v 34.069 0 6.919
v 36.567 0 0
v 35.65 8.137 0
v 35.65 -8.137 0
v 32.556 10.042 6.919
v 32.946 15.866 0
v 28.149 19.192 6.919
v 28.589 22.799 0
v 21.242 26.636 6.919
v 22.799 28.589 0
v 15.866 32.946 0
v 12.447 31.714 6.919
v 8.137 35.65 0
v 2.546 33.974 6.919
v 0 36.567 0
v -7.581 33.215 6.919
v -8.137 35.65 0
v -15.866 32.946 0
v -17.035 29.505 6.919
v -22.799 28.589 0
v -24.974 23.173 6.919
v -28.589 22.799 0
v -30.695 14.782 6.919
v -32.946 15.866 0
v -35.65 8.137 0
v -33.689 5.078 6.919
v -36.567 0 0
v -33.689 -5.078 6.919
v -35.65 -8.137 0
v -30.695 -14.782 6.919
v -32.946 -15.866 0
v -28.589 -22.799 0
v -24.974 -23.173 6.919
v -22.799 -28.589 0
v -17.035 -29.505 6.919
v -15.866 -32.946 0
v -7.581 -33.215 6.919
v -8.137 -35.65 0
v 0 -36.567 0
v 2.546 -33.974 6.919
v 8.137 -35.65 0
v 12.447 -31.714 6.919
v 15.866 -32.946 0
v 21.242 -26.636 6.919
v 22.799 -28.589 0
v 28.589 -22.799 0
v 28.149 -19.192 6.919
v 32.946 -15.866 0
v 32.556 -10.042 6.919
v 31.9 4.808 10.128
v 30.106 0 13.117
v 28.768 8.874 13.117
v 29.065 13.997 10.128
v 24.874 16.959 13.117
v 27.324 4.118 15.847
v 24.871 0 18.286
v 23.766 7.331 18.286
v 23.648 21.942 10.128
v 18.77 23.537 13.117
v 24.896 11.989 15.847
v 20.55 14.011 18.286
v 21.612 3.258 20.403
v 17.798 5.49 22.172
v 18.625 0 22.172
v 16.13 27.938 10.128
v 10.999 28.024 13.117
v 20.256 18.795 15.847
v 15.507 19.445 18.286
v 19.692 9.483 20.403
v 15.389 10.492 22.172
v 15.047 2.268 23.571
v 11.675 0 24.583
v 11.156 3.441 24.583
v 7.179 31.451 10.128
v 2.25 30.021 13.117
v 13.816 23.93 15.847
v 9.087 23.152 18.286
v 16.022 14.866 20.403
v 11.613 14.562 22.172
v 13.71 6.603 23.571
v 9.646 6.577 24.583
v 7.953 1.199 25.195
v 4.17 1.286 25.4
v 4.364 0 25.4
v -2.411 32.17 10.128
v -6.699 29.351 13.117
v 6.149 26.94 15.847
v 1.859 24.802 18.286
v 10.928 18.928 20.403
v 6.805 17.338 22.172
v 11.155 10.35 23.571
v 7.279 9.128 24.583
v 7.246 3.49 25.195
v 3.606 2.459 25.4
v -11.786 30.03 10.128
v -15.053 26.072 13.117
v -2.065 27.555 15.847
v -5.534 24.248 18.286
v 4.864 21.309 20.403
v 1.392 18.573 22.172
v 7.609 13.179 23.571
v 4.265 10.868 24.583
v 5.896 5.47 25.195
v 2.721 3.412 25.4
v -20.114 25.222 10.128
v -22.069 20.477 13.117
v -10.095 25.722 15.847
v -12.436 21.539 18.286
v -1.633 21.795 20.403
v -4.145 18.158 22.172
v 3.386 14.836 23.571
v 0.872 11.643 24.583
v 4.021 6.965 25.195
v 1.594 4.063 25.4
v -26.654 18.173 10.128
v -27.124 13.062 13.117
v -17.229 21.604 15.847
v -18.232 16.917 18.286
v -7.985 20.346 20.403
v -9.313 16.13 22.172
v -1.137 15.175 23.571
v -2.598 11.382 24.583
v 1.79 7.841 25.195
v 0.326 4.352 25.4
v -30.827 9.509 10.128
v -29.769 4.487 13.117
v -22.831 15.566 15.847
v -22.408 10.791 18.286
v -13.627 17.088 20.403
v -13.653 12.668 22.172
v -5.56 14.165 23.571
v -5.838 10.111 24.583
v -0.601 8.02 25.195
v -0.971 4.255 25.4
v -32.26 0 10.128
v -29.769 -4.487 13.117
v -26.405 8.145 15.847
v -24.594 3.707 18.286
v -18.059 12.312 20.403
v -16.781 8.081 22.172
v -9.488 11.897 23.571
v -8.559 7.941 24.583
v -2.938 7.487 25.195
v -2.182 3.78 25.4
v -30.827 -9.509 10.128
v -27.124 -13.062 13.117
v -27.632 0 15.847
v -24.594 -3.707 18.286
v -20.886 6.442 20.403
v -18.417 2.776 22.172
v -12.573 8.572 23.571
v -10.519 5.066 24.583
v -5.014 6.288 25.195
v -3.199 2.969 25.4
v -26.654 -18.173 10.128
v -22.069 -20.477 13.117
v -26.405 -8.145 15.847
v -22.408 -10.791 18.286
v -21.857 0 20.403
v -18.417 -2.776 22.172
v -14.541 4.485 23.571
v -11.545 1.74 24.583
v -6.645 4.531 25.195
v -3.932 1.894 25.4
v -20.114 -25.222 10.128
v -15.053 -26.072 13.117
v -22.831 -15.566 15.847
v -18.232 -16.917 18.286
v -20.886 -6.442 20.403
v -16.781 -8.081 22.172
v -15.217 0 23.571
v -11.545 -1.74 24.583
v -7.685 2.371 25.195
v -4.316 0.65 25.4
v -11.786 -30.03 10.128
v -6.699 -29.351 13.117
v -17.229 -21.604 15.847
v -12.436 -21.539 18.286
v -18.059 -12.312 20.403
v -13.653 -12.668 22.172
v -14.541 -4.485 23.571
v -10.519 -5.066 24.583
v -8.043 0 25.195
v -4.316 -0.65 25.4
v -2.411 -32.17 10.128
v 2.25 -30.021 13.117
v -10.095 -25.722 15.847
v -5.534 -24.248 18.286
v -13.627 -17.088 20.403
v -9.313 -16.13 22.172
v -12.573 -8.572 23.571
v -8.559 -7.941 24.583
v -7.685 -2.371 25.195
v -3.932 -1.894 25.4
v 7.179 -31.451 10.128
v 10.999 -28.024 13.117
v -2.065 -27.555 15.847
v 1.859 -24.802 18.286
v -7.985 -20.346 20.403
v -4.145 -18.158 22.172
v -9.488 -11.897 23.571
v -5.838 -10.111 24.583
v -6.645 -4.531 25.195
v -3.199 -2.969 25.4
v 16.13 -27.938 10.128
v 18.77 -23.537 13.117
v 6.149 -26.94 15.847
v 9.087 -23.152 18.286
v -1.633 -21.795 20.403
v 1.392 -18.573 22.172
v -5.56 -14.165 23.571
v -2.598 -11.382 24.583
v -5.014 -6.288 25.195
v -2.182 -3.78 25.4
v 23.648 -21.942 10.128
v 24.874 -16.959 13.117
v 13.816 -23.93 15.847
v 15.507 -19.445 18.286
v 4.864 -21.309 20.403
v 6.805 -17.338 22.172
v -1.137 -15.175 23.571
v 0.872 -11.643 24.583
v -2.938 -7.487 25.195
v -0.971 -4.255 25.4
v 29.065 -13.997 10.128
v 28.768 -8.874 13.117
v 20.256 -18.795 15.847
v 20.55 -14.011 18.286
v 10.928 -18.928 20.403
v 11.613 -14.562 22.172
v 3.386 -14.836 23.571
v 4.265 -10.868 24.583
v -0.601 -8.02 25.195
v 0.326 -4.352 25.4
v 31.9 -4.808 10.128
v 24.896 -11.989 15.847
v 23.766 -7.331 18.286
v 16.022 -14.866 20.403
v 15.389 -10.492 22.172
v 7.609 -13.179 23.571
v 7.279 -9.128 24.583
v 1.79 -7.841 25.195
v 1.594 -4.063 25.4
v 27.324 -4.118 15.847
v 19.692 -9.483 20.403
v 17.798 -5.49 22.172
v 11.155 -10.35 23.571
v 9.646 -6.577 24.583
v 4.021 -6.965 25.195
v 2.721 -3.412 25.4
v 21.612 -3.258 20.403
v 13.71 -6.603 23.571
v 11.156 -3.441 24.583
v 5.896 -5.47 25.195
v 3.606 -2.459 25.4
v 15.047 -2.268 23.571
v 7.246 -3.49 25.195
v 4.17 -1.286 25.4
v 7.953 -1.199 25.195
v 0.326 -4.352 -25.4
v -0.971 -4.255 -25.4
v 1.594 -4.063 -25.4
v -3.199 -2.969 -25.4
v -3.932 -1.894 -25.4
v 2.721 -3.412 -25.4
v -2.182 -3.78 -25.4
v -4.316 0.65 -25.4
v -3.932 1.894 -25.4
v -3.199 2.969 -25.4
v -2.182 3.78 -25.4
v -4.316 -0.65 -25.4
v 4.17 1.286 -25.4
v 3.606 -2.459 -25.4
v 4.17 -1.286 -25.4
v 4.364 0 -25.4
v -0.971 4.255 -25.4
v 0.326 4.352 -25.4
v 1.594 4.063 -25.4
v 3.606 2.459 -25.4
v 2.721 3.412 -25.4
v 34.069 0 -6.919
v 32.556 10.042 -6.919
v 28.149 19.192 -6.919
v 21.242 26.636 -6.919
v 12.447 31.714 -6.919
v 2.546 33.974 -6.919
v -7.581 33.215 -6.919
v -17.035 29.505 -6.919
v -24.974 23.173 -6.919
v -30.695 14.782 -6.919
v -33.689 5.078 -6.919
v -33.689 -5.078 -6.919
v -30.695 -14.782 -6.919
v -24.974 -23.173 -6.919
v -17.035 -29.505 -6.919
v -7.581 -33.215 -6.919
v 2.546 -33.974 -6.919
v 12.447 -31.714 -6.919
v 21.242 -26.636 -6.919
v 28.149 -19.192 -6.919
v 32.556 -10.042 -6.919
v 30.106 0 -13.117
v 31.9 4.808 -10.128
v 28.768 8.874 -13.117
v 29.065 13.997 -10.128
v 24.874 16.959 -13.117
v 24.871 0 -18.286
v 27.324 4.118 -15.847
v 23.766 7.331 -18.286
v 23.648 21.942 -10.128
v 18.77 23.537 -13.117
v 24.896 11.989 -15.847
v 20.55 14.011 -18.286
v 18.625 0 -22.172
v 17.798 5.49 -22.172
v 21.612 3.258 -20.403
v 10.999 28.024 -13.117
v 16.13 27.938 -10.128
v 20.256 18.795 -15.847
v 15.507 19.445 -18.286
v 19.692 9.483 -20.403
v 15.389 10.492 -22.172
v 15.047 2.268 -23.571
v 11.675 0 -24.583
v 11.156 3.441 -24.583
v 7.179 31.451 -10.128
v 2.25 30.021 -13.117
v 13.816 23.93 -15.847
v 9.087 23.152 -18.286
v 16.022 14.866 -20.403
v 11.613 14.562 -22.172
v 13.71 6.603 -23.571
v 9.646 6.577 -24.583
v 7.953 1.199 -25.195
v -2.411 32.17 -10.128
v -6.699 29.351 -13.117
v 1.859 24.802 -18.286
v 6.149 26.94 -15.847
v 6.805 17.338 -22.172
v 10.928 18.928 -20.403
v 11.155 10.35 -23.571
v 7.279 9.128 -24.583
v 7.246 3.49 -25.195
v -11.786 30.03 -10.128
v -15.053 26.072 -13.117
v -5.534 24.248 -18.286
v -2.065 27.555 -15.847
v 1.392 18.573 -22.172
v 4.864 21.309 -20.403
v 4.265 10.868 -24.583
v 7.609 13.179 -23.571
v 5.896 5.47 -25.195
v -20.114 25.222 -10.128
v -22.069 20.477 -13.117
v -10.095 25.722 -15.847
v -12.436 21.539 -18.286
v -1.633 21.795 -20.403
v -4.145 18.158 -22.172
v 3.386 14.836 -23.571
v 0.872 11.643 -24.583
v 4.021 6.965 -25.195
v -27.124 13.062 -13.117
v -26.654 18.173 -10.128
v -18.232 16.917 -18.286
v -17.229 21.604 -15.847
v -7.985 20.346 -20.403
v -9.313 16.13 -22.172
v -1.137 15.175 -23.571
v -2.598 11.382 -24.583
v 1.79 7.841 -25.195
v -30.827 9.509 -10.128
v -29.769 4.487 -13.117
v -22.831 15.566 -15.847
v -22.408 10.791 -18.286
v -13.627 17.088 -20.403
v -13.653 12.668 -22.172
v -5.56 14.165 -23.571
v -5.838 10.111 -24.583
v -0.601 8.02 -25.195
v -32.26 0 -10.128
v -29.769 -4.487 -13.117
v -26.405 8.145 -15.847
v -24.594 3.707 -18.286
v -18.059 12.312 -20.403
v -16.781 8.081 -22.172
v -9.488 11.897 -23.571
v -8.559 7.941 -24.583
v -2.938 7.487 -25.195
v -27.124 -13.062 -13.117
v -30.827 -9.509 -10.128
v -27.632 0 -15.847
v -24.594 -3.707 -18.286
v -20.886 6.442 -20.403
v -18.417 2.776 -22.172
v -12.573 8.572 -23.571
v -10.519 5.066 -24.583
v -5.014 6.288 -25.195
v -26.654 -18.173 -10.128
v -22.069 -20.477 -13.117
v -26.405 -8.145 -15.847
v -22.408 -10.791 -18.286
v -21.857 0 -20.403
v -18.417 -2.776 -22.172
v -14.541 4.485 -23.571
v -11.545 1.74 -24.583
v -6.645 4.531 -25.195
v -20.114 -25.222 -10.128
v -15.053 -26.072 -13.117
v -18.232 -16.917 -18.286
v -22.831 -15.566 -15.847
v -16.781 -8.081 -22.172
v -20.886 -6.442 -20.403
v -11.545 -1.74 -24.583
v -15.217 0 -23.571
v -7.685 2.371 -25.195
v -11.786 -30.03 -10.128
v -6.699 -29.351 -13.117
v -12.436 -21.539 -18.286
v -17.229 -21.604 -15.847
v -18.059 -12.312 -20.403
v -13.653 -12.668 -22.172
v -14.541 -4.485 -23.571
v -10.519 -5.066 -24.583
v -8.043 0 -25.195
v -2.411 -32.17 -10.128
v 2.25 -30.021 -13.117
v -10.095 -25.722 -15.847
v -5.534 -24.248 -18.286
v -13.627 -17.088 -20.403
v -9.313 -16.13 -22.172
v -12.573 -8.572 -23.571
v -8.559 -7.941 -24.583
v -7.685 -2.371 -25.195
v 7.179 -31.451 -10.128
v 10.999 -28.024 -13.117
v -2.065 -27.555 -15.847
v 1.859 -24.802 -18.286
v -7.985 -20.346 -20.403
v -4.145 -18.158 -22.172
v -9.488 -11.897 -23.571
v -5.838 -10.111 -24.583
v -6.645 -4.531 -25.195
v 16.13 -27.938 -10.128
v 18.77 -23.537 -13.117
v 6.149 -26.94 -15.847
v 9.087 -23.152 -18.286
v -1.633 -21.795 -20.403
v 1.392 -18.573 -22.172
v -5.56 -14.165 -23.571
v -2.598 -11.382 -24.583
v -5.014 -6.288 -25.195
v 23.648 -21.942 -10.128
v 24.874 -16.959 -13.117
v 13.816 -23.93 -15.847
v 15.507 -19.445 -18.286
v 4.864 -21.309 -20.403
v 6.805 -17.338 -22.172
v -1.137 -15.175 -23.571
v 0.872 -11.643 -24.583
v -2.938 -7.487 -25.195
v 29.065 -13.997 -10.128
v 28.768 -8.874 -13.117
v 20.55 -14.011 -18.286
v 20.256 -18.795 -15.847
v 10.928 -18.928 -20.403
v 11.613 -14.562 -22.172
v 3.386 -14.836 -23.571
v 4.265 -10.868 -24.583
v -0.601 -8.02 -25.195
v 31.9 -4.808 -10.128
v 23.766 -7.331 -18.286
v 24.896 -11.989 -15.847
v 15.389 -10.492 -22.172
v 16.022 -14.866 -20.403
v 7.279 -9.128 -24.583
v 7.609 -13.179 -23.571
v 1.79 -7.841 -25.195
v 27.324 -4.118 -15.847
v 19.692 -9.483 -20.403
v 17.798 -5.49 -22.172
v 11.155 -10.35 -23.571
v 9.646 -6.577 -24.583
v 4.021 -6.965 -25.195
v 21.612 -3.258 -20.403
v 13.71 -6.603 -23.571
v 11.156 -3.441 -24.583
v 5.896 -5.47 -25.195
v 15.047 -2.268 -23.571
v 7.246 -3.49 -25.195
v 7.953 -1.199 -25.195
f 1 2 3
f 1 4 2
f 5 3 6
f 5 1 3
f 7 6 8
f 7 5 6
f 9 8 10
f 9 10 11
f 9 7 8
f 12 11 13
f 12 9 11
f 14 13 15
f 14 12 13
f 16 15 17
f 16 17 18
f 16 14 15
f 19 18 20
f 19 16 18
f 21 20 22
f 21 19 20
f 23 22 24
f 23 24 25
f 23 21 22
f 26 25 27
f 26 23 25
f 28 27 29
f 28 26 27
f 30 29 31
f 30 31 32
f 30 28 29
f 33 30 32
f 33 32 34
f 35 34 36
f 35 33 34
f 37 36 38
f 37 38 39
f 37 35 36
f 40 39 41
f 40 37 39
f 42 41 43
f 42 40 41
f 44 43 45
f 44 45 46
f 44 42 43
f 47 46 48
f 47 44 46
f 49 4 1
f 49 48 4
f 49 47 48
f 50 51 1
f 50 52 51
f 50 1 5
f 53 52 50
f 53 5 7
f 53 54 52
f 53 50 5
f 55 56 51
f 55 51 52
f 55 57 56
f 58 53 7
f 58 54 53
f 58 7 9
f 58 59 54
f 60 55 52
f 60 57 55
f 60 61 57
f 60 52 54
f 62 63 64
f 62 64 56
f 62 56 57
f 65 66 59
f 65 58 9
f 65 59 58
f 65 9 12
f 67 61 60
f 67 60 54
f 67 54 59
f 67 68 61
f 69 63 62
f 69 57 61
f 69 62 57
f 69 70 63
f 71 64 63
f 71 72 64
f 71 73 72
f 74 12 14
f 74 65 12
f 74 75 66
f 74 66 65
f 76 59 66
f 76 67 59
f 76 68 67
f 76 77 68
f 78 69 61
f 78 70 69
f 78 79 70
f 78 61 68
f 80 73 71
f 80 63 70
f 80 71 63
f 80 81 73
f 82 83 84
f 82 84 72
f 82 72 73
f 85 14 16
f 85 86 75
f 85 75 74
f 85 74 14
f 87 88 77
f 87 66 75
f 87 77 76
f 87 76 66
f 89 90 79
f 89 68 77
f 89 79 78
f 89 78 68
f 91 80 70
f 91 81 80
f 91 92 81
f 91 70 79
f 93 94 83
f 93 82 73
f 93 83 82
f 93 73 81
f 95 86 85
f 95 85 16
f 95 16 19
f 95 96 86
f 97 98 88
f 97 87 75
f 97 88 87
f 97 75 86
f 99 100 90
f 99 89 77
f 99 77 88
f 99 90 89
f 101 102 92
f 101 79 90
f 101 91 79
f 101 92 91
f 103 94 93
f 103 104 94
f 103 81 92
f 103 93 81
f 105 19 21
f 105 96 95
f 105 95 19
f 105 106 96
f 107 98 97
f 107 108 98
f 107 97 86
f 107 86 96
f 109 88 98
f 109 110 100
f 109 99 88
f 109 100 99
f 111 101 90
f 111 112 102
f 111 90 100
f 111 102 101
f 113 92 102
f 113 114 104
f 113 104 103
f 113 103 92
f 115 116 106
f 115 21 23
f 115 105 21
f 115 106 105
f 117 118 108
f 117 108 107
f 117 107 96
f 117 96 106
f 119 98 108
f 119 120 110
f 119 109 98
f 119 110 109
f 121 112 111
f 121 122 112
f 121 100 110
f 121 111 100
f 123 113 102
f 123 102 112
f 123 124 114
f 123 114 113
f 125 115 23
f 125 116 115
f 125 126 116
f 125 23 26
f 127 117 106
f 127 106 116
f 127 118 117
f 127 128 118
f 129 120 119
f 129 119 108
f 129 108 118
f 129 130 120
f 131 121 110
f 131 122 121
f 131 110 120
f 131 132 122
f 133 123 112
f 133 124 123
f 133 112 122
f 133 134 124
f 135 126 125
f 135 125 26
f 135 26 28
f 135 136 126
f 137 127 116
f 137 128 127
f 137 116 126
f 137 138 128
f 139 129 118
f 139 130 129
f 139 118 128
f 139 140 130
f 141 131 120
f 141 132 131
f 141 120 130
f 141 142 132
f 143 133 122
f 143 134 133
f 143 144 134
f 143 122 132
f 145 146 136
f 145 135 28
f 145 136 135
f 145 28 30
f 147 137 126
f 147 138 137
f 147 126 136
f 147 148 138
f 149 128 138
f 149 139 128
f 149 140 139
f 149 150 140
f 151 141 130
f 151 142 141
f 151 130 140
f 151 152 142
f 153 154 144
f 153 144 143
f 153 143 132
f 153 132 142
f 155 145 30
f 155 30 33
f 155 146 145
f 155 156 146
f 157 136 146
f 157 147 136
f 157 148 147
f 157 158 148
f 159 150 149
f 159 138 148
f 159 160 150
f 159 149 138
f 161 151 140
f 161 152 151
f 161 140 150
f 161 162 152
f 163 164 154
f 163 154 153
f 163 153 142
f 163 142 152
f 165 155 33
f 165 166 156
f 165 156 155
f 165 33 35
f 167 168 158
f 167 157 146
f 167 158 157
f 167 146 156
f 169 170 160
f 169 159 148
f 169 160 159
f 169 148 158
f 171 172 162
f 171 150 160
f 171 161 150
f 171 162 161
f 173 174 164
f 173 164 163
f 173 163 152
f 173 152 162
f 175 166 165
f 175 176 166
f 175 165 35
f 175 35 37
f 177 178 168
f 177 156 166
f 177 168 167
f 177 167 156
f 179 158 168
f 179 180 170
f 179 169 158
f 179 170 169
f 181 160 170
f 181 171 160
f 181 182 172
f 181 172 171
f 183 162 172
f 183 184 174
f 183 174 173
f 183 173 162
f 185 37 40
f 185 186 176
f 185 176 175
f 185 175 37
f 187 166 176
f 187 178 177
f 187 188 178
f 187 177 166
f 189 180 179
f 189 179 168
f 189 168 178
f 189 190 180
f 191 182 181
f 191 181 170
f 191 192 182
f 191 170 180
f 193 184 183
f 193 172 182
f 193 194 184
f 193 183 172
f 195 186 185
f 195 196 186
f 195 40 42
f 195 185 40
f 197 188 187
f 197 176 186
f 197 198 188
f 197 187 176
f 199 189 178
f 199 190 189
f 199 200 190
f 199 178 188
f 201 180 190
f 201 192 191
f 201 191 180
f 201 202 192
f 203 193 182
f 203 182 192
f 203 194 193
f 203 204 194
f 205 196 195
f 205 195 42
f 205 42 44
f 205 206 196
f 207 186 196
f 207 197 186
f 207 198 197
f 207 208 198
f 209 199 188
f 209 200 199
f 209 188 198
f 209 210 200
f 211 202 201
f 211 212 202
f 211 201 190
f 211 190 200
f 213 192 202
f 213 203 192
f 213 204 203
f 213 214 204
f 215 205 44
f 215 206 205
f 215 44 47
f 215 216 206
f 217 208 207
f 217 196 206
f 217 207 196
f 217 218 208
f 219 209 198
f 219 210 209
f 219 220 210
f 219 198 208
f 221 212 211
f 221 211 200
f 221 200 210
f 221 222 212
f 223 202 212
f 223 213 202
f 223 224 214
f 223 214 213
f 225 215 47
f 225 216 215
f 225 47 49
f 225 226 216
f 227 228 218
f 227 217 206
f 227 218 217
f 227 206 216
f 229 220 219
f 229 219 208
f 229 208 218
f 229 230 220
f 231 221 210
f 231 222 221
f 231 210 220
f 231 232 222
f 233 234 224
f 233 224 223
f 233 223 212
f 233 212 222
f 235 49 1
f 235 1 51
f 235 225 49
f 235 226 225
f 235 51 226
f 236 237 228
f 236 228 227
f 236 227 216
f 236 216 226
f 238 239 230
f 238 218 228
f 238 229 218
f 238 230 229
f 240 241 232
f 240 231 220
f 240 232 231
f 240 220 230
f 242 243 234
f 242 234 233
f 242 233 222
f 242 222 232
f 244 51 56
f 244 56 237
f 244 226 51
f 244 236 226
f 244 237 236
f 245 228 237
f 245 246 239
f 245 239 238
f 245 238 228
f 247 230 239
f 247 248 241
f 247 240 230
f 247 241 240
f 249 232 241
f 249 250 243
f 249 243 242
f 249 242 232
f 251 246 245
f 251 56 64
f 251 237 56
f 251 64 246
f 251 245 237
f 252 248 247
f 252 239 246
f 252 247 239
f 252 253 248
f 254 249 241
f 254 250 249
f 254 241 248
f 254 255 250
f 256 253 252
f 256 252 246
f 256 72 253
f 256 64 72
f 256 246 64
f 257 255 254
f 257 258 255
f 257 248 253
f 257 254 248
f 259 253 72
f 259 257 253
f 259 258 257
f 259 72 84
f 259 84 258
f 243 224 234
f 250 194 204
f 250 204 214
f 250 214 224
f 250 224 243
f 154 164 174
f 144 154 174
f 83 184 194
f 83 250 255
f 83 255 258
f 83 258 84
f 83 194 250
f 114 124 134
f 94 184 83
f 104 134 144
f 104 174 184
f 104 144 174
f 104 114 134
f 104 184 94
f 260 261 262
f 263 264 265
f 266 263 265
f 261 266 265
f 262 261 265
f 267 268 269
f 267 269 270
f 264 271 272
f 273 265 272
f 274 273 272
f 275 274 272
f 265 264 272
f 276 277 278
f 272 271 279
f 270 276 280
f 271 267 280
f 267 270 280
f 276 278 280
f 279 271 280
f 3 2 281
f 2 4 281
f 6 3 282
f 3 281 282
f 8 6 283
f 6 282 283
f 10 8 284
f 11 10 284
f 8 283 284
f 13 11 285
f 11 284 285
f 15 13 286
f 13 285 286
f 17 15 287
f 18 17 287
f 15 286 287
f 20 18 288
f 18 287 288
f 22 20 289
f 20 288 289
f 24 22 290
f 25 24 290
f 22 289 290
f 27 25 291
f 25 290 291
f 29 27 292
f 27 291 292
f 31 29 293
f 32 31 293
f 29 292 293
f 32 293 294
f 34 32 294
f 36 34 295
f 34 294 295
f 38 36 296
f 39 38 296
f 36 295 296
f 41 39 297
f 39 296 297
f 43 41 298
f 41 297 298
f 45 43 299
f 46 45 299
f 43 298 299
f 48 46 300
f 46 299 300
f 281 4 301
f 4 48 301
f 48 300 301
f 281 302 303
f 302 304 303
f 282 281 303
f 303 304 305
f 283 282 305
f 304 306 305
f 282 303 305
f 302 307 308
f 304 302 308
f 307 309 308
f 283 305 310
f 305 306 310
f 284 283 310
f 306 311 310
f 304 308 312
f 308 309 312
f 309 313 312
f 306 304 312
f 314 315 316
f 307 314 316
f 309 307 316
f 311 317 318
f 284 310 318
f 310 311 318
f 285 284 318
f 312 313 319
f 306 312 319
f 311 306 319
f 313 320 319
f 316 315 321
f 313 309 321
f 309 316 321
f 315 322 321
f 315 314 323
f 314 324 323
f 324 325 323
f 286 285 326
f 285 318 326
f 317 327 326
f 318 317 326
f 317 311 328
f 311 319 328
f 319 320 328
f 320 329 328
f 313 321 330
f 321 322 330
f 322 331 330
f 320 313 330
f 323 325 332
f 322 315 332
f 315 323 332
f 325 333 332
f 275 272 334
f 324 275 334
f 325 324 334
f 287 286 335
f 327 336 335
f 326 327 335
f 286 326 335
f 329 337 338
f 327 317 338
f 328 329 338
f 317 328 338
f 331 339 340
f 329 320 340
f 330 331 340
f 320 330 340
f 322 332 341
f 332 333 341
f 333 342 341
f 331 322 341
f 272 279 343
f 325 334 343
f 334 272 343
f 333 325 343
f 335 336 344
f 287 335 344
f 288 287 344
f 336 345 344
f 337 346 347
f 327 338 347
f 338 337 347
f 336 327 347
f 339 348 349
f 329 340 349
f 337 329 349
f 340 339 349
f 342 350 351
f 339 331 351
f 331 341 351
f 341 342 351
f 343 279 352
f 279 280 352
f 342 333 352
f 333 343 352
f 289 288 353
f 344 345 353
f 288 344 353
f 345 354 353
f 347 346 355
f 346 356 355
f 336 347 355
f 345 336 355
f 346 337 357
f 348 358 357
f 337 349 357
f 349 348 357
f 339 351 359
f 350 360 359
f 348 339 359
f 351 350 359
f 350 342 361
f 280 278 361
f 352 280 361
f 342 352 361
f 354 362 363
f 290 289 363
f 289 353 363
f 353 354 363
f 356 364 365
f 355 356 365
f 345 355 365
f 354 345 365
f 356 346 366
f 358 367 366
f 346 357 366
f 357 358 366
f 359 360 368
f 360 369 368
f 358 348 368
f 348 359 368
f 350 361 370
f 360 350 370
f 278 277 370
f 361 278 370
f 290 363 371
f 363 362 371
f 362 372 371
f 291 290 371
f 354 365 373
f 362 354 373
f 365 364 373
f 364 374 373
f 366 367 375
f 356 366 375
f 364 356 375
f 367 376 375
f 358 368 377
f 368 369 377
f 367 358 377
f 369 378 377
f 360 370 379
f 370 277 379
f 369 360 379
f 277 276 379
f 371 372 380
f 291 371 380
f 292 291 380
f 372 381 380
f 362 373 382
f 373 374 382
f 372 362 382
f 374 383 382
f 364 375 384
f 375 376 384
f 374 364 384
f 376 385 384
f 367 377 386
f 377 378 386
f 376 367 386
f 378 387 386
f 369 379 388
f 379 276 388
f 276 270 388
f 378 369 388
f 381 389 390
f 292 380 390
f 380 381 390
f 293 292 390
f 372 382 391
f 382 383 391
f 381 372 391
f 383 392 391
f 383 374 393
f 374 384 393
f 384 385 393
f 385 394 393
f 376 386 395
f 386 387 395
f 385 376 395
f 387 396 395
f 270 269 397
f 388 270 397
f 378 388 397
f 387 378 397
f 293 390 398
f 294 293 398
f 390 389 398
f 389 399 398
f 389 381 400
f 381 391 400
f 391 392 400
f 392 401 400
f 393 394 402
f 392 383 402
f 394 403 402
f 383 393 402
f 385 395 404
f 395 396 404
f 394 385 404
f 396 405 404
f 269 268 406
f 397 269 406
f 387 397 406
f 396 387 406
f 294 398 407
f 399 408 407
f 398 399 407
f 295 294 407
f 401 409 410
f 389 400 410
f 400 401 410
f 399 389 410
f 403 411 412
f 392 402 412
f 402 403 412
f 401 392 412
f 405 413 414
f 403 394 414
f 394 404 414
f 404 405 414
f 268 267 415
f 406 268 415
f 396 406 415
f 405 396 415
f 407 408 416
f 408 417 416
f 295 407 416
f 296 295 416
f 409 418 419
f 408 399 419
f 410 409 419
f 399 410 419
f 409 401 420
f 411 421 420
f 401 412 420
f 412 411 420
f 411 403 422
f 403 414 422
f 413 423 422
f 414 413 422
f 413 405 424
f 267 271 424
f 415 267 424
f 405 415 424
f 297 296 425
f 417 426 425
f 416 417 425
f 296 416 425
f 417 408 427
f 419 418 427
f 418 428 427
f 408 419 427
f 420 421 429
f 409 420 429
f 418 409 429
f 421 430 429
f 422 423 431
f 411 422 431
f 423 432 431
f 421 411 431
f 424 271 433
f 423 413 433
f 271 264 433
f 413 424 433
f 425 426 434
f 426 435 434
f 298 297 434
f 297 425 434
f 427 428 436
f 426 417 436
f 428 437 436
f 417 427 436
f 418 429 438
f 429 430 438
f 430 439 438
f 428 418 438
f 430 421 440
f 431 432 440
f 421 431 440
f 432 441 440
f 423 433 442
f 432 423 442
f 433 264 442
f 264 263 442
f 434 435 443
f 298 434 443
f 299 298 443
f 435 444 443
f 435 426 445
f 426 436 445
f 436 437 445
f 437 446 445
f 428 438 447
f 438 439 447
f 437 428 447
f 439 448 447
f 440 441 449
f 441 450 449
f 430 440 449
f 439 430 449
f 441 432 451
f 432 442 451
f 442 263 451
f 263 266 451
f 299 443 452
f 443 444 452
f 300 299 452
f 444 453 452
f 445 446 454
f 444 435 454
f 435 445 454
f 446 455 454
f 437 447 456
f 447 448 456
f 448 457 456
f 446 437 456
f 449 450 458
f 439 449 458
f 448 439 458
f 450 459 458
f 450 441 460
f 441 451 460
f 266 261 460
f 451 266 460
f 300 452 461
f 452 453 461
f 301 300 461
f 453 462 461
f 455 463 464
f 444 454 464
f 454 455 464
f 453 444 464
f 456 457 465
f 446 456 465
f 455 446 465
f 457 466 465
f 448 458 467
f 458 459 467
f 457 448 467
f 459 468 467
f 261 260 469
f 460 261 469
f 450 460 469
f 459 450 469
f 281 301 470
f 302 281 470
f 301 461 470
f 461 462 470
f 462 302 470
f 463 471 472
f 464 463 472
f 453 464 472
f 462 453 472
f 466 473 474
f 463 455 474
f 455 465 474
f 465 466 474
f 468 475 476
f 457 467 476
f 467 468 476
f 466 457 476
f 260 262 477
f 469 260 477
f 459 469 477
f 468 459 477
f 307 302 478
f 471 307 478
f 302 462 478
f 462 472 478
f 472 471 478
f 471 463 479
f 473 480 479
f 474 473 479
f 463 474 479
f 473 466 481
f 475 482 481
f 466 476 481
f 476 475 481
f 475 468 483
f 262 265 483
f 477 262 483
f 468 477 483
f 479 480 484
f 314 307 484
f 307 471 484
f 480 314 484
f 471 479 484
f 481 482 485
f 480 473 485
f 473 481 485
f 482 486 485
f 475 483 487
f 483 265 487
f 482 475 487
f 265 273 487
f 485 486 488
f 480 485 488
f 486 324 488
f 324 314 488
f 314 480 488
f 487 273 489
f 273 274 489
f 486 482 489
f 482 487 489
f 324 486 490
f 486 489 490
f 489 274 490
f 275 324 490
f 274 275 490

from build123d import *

# Parameters (mm, degrees)
F0_R     = 36.5668122635
F1_DEPTH = 25.4


# Not quite as in the source:
# - a fillet or chamfer that OpenCascade refuses, or shapes differently, is made with other operations: its cross-section is extruded or revolved along the edge and cut away or added


with BuildPart() as f1:
    # F0 (on Top) → F1 (new body)
    with BuildSketch(Plane.XY):
        Circle(F0_R)
    extrude(amount=F1_DEPTH)

    # F2: fillet of radius 33.1133532215 on 1 edges, made by hand

    # F2_s1 → F2_t2 (revolve, cut)
    with BuildSketch(Plane.XZ):
        with BuildLine():
            ThreePointArc((36.5668122635, 0), (24.8714154597, 18.2857732188), (4.364353605, 25.4))
            Line((4.364353605, 25.4), (36.5668122635, 25.4))
            Line((36.5668122635, 25.4), (36.5668122635, 0))
        make_face()
    revolve(axis=Axis((0, 0, 25.4), (0, 0, 1)), mode=Mode.SUBTRACT)

    # F3: F1 across plane


with BuildPart() as f1_1:
    add(f1.part)
    add(f1.part.mirror(Plane.XY))


solid = f1_1.part
